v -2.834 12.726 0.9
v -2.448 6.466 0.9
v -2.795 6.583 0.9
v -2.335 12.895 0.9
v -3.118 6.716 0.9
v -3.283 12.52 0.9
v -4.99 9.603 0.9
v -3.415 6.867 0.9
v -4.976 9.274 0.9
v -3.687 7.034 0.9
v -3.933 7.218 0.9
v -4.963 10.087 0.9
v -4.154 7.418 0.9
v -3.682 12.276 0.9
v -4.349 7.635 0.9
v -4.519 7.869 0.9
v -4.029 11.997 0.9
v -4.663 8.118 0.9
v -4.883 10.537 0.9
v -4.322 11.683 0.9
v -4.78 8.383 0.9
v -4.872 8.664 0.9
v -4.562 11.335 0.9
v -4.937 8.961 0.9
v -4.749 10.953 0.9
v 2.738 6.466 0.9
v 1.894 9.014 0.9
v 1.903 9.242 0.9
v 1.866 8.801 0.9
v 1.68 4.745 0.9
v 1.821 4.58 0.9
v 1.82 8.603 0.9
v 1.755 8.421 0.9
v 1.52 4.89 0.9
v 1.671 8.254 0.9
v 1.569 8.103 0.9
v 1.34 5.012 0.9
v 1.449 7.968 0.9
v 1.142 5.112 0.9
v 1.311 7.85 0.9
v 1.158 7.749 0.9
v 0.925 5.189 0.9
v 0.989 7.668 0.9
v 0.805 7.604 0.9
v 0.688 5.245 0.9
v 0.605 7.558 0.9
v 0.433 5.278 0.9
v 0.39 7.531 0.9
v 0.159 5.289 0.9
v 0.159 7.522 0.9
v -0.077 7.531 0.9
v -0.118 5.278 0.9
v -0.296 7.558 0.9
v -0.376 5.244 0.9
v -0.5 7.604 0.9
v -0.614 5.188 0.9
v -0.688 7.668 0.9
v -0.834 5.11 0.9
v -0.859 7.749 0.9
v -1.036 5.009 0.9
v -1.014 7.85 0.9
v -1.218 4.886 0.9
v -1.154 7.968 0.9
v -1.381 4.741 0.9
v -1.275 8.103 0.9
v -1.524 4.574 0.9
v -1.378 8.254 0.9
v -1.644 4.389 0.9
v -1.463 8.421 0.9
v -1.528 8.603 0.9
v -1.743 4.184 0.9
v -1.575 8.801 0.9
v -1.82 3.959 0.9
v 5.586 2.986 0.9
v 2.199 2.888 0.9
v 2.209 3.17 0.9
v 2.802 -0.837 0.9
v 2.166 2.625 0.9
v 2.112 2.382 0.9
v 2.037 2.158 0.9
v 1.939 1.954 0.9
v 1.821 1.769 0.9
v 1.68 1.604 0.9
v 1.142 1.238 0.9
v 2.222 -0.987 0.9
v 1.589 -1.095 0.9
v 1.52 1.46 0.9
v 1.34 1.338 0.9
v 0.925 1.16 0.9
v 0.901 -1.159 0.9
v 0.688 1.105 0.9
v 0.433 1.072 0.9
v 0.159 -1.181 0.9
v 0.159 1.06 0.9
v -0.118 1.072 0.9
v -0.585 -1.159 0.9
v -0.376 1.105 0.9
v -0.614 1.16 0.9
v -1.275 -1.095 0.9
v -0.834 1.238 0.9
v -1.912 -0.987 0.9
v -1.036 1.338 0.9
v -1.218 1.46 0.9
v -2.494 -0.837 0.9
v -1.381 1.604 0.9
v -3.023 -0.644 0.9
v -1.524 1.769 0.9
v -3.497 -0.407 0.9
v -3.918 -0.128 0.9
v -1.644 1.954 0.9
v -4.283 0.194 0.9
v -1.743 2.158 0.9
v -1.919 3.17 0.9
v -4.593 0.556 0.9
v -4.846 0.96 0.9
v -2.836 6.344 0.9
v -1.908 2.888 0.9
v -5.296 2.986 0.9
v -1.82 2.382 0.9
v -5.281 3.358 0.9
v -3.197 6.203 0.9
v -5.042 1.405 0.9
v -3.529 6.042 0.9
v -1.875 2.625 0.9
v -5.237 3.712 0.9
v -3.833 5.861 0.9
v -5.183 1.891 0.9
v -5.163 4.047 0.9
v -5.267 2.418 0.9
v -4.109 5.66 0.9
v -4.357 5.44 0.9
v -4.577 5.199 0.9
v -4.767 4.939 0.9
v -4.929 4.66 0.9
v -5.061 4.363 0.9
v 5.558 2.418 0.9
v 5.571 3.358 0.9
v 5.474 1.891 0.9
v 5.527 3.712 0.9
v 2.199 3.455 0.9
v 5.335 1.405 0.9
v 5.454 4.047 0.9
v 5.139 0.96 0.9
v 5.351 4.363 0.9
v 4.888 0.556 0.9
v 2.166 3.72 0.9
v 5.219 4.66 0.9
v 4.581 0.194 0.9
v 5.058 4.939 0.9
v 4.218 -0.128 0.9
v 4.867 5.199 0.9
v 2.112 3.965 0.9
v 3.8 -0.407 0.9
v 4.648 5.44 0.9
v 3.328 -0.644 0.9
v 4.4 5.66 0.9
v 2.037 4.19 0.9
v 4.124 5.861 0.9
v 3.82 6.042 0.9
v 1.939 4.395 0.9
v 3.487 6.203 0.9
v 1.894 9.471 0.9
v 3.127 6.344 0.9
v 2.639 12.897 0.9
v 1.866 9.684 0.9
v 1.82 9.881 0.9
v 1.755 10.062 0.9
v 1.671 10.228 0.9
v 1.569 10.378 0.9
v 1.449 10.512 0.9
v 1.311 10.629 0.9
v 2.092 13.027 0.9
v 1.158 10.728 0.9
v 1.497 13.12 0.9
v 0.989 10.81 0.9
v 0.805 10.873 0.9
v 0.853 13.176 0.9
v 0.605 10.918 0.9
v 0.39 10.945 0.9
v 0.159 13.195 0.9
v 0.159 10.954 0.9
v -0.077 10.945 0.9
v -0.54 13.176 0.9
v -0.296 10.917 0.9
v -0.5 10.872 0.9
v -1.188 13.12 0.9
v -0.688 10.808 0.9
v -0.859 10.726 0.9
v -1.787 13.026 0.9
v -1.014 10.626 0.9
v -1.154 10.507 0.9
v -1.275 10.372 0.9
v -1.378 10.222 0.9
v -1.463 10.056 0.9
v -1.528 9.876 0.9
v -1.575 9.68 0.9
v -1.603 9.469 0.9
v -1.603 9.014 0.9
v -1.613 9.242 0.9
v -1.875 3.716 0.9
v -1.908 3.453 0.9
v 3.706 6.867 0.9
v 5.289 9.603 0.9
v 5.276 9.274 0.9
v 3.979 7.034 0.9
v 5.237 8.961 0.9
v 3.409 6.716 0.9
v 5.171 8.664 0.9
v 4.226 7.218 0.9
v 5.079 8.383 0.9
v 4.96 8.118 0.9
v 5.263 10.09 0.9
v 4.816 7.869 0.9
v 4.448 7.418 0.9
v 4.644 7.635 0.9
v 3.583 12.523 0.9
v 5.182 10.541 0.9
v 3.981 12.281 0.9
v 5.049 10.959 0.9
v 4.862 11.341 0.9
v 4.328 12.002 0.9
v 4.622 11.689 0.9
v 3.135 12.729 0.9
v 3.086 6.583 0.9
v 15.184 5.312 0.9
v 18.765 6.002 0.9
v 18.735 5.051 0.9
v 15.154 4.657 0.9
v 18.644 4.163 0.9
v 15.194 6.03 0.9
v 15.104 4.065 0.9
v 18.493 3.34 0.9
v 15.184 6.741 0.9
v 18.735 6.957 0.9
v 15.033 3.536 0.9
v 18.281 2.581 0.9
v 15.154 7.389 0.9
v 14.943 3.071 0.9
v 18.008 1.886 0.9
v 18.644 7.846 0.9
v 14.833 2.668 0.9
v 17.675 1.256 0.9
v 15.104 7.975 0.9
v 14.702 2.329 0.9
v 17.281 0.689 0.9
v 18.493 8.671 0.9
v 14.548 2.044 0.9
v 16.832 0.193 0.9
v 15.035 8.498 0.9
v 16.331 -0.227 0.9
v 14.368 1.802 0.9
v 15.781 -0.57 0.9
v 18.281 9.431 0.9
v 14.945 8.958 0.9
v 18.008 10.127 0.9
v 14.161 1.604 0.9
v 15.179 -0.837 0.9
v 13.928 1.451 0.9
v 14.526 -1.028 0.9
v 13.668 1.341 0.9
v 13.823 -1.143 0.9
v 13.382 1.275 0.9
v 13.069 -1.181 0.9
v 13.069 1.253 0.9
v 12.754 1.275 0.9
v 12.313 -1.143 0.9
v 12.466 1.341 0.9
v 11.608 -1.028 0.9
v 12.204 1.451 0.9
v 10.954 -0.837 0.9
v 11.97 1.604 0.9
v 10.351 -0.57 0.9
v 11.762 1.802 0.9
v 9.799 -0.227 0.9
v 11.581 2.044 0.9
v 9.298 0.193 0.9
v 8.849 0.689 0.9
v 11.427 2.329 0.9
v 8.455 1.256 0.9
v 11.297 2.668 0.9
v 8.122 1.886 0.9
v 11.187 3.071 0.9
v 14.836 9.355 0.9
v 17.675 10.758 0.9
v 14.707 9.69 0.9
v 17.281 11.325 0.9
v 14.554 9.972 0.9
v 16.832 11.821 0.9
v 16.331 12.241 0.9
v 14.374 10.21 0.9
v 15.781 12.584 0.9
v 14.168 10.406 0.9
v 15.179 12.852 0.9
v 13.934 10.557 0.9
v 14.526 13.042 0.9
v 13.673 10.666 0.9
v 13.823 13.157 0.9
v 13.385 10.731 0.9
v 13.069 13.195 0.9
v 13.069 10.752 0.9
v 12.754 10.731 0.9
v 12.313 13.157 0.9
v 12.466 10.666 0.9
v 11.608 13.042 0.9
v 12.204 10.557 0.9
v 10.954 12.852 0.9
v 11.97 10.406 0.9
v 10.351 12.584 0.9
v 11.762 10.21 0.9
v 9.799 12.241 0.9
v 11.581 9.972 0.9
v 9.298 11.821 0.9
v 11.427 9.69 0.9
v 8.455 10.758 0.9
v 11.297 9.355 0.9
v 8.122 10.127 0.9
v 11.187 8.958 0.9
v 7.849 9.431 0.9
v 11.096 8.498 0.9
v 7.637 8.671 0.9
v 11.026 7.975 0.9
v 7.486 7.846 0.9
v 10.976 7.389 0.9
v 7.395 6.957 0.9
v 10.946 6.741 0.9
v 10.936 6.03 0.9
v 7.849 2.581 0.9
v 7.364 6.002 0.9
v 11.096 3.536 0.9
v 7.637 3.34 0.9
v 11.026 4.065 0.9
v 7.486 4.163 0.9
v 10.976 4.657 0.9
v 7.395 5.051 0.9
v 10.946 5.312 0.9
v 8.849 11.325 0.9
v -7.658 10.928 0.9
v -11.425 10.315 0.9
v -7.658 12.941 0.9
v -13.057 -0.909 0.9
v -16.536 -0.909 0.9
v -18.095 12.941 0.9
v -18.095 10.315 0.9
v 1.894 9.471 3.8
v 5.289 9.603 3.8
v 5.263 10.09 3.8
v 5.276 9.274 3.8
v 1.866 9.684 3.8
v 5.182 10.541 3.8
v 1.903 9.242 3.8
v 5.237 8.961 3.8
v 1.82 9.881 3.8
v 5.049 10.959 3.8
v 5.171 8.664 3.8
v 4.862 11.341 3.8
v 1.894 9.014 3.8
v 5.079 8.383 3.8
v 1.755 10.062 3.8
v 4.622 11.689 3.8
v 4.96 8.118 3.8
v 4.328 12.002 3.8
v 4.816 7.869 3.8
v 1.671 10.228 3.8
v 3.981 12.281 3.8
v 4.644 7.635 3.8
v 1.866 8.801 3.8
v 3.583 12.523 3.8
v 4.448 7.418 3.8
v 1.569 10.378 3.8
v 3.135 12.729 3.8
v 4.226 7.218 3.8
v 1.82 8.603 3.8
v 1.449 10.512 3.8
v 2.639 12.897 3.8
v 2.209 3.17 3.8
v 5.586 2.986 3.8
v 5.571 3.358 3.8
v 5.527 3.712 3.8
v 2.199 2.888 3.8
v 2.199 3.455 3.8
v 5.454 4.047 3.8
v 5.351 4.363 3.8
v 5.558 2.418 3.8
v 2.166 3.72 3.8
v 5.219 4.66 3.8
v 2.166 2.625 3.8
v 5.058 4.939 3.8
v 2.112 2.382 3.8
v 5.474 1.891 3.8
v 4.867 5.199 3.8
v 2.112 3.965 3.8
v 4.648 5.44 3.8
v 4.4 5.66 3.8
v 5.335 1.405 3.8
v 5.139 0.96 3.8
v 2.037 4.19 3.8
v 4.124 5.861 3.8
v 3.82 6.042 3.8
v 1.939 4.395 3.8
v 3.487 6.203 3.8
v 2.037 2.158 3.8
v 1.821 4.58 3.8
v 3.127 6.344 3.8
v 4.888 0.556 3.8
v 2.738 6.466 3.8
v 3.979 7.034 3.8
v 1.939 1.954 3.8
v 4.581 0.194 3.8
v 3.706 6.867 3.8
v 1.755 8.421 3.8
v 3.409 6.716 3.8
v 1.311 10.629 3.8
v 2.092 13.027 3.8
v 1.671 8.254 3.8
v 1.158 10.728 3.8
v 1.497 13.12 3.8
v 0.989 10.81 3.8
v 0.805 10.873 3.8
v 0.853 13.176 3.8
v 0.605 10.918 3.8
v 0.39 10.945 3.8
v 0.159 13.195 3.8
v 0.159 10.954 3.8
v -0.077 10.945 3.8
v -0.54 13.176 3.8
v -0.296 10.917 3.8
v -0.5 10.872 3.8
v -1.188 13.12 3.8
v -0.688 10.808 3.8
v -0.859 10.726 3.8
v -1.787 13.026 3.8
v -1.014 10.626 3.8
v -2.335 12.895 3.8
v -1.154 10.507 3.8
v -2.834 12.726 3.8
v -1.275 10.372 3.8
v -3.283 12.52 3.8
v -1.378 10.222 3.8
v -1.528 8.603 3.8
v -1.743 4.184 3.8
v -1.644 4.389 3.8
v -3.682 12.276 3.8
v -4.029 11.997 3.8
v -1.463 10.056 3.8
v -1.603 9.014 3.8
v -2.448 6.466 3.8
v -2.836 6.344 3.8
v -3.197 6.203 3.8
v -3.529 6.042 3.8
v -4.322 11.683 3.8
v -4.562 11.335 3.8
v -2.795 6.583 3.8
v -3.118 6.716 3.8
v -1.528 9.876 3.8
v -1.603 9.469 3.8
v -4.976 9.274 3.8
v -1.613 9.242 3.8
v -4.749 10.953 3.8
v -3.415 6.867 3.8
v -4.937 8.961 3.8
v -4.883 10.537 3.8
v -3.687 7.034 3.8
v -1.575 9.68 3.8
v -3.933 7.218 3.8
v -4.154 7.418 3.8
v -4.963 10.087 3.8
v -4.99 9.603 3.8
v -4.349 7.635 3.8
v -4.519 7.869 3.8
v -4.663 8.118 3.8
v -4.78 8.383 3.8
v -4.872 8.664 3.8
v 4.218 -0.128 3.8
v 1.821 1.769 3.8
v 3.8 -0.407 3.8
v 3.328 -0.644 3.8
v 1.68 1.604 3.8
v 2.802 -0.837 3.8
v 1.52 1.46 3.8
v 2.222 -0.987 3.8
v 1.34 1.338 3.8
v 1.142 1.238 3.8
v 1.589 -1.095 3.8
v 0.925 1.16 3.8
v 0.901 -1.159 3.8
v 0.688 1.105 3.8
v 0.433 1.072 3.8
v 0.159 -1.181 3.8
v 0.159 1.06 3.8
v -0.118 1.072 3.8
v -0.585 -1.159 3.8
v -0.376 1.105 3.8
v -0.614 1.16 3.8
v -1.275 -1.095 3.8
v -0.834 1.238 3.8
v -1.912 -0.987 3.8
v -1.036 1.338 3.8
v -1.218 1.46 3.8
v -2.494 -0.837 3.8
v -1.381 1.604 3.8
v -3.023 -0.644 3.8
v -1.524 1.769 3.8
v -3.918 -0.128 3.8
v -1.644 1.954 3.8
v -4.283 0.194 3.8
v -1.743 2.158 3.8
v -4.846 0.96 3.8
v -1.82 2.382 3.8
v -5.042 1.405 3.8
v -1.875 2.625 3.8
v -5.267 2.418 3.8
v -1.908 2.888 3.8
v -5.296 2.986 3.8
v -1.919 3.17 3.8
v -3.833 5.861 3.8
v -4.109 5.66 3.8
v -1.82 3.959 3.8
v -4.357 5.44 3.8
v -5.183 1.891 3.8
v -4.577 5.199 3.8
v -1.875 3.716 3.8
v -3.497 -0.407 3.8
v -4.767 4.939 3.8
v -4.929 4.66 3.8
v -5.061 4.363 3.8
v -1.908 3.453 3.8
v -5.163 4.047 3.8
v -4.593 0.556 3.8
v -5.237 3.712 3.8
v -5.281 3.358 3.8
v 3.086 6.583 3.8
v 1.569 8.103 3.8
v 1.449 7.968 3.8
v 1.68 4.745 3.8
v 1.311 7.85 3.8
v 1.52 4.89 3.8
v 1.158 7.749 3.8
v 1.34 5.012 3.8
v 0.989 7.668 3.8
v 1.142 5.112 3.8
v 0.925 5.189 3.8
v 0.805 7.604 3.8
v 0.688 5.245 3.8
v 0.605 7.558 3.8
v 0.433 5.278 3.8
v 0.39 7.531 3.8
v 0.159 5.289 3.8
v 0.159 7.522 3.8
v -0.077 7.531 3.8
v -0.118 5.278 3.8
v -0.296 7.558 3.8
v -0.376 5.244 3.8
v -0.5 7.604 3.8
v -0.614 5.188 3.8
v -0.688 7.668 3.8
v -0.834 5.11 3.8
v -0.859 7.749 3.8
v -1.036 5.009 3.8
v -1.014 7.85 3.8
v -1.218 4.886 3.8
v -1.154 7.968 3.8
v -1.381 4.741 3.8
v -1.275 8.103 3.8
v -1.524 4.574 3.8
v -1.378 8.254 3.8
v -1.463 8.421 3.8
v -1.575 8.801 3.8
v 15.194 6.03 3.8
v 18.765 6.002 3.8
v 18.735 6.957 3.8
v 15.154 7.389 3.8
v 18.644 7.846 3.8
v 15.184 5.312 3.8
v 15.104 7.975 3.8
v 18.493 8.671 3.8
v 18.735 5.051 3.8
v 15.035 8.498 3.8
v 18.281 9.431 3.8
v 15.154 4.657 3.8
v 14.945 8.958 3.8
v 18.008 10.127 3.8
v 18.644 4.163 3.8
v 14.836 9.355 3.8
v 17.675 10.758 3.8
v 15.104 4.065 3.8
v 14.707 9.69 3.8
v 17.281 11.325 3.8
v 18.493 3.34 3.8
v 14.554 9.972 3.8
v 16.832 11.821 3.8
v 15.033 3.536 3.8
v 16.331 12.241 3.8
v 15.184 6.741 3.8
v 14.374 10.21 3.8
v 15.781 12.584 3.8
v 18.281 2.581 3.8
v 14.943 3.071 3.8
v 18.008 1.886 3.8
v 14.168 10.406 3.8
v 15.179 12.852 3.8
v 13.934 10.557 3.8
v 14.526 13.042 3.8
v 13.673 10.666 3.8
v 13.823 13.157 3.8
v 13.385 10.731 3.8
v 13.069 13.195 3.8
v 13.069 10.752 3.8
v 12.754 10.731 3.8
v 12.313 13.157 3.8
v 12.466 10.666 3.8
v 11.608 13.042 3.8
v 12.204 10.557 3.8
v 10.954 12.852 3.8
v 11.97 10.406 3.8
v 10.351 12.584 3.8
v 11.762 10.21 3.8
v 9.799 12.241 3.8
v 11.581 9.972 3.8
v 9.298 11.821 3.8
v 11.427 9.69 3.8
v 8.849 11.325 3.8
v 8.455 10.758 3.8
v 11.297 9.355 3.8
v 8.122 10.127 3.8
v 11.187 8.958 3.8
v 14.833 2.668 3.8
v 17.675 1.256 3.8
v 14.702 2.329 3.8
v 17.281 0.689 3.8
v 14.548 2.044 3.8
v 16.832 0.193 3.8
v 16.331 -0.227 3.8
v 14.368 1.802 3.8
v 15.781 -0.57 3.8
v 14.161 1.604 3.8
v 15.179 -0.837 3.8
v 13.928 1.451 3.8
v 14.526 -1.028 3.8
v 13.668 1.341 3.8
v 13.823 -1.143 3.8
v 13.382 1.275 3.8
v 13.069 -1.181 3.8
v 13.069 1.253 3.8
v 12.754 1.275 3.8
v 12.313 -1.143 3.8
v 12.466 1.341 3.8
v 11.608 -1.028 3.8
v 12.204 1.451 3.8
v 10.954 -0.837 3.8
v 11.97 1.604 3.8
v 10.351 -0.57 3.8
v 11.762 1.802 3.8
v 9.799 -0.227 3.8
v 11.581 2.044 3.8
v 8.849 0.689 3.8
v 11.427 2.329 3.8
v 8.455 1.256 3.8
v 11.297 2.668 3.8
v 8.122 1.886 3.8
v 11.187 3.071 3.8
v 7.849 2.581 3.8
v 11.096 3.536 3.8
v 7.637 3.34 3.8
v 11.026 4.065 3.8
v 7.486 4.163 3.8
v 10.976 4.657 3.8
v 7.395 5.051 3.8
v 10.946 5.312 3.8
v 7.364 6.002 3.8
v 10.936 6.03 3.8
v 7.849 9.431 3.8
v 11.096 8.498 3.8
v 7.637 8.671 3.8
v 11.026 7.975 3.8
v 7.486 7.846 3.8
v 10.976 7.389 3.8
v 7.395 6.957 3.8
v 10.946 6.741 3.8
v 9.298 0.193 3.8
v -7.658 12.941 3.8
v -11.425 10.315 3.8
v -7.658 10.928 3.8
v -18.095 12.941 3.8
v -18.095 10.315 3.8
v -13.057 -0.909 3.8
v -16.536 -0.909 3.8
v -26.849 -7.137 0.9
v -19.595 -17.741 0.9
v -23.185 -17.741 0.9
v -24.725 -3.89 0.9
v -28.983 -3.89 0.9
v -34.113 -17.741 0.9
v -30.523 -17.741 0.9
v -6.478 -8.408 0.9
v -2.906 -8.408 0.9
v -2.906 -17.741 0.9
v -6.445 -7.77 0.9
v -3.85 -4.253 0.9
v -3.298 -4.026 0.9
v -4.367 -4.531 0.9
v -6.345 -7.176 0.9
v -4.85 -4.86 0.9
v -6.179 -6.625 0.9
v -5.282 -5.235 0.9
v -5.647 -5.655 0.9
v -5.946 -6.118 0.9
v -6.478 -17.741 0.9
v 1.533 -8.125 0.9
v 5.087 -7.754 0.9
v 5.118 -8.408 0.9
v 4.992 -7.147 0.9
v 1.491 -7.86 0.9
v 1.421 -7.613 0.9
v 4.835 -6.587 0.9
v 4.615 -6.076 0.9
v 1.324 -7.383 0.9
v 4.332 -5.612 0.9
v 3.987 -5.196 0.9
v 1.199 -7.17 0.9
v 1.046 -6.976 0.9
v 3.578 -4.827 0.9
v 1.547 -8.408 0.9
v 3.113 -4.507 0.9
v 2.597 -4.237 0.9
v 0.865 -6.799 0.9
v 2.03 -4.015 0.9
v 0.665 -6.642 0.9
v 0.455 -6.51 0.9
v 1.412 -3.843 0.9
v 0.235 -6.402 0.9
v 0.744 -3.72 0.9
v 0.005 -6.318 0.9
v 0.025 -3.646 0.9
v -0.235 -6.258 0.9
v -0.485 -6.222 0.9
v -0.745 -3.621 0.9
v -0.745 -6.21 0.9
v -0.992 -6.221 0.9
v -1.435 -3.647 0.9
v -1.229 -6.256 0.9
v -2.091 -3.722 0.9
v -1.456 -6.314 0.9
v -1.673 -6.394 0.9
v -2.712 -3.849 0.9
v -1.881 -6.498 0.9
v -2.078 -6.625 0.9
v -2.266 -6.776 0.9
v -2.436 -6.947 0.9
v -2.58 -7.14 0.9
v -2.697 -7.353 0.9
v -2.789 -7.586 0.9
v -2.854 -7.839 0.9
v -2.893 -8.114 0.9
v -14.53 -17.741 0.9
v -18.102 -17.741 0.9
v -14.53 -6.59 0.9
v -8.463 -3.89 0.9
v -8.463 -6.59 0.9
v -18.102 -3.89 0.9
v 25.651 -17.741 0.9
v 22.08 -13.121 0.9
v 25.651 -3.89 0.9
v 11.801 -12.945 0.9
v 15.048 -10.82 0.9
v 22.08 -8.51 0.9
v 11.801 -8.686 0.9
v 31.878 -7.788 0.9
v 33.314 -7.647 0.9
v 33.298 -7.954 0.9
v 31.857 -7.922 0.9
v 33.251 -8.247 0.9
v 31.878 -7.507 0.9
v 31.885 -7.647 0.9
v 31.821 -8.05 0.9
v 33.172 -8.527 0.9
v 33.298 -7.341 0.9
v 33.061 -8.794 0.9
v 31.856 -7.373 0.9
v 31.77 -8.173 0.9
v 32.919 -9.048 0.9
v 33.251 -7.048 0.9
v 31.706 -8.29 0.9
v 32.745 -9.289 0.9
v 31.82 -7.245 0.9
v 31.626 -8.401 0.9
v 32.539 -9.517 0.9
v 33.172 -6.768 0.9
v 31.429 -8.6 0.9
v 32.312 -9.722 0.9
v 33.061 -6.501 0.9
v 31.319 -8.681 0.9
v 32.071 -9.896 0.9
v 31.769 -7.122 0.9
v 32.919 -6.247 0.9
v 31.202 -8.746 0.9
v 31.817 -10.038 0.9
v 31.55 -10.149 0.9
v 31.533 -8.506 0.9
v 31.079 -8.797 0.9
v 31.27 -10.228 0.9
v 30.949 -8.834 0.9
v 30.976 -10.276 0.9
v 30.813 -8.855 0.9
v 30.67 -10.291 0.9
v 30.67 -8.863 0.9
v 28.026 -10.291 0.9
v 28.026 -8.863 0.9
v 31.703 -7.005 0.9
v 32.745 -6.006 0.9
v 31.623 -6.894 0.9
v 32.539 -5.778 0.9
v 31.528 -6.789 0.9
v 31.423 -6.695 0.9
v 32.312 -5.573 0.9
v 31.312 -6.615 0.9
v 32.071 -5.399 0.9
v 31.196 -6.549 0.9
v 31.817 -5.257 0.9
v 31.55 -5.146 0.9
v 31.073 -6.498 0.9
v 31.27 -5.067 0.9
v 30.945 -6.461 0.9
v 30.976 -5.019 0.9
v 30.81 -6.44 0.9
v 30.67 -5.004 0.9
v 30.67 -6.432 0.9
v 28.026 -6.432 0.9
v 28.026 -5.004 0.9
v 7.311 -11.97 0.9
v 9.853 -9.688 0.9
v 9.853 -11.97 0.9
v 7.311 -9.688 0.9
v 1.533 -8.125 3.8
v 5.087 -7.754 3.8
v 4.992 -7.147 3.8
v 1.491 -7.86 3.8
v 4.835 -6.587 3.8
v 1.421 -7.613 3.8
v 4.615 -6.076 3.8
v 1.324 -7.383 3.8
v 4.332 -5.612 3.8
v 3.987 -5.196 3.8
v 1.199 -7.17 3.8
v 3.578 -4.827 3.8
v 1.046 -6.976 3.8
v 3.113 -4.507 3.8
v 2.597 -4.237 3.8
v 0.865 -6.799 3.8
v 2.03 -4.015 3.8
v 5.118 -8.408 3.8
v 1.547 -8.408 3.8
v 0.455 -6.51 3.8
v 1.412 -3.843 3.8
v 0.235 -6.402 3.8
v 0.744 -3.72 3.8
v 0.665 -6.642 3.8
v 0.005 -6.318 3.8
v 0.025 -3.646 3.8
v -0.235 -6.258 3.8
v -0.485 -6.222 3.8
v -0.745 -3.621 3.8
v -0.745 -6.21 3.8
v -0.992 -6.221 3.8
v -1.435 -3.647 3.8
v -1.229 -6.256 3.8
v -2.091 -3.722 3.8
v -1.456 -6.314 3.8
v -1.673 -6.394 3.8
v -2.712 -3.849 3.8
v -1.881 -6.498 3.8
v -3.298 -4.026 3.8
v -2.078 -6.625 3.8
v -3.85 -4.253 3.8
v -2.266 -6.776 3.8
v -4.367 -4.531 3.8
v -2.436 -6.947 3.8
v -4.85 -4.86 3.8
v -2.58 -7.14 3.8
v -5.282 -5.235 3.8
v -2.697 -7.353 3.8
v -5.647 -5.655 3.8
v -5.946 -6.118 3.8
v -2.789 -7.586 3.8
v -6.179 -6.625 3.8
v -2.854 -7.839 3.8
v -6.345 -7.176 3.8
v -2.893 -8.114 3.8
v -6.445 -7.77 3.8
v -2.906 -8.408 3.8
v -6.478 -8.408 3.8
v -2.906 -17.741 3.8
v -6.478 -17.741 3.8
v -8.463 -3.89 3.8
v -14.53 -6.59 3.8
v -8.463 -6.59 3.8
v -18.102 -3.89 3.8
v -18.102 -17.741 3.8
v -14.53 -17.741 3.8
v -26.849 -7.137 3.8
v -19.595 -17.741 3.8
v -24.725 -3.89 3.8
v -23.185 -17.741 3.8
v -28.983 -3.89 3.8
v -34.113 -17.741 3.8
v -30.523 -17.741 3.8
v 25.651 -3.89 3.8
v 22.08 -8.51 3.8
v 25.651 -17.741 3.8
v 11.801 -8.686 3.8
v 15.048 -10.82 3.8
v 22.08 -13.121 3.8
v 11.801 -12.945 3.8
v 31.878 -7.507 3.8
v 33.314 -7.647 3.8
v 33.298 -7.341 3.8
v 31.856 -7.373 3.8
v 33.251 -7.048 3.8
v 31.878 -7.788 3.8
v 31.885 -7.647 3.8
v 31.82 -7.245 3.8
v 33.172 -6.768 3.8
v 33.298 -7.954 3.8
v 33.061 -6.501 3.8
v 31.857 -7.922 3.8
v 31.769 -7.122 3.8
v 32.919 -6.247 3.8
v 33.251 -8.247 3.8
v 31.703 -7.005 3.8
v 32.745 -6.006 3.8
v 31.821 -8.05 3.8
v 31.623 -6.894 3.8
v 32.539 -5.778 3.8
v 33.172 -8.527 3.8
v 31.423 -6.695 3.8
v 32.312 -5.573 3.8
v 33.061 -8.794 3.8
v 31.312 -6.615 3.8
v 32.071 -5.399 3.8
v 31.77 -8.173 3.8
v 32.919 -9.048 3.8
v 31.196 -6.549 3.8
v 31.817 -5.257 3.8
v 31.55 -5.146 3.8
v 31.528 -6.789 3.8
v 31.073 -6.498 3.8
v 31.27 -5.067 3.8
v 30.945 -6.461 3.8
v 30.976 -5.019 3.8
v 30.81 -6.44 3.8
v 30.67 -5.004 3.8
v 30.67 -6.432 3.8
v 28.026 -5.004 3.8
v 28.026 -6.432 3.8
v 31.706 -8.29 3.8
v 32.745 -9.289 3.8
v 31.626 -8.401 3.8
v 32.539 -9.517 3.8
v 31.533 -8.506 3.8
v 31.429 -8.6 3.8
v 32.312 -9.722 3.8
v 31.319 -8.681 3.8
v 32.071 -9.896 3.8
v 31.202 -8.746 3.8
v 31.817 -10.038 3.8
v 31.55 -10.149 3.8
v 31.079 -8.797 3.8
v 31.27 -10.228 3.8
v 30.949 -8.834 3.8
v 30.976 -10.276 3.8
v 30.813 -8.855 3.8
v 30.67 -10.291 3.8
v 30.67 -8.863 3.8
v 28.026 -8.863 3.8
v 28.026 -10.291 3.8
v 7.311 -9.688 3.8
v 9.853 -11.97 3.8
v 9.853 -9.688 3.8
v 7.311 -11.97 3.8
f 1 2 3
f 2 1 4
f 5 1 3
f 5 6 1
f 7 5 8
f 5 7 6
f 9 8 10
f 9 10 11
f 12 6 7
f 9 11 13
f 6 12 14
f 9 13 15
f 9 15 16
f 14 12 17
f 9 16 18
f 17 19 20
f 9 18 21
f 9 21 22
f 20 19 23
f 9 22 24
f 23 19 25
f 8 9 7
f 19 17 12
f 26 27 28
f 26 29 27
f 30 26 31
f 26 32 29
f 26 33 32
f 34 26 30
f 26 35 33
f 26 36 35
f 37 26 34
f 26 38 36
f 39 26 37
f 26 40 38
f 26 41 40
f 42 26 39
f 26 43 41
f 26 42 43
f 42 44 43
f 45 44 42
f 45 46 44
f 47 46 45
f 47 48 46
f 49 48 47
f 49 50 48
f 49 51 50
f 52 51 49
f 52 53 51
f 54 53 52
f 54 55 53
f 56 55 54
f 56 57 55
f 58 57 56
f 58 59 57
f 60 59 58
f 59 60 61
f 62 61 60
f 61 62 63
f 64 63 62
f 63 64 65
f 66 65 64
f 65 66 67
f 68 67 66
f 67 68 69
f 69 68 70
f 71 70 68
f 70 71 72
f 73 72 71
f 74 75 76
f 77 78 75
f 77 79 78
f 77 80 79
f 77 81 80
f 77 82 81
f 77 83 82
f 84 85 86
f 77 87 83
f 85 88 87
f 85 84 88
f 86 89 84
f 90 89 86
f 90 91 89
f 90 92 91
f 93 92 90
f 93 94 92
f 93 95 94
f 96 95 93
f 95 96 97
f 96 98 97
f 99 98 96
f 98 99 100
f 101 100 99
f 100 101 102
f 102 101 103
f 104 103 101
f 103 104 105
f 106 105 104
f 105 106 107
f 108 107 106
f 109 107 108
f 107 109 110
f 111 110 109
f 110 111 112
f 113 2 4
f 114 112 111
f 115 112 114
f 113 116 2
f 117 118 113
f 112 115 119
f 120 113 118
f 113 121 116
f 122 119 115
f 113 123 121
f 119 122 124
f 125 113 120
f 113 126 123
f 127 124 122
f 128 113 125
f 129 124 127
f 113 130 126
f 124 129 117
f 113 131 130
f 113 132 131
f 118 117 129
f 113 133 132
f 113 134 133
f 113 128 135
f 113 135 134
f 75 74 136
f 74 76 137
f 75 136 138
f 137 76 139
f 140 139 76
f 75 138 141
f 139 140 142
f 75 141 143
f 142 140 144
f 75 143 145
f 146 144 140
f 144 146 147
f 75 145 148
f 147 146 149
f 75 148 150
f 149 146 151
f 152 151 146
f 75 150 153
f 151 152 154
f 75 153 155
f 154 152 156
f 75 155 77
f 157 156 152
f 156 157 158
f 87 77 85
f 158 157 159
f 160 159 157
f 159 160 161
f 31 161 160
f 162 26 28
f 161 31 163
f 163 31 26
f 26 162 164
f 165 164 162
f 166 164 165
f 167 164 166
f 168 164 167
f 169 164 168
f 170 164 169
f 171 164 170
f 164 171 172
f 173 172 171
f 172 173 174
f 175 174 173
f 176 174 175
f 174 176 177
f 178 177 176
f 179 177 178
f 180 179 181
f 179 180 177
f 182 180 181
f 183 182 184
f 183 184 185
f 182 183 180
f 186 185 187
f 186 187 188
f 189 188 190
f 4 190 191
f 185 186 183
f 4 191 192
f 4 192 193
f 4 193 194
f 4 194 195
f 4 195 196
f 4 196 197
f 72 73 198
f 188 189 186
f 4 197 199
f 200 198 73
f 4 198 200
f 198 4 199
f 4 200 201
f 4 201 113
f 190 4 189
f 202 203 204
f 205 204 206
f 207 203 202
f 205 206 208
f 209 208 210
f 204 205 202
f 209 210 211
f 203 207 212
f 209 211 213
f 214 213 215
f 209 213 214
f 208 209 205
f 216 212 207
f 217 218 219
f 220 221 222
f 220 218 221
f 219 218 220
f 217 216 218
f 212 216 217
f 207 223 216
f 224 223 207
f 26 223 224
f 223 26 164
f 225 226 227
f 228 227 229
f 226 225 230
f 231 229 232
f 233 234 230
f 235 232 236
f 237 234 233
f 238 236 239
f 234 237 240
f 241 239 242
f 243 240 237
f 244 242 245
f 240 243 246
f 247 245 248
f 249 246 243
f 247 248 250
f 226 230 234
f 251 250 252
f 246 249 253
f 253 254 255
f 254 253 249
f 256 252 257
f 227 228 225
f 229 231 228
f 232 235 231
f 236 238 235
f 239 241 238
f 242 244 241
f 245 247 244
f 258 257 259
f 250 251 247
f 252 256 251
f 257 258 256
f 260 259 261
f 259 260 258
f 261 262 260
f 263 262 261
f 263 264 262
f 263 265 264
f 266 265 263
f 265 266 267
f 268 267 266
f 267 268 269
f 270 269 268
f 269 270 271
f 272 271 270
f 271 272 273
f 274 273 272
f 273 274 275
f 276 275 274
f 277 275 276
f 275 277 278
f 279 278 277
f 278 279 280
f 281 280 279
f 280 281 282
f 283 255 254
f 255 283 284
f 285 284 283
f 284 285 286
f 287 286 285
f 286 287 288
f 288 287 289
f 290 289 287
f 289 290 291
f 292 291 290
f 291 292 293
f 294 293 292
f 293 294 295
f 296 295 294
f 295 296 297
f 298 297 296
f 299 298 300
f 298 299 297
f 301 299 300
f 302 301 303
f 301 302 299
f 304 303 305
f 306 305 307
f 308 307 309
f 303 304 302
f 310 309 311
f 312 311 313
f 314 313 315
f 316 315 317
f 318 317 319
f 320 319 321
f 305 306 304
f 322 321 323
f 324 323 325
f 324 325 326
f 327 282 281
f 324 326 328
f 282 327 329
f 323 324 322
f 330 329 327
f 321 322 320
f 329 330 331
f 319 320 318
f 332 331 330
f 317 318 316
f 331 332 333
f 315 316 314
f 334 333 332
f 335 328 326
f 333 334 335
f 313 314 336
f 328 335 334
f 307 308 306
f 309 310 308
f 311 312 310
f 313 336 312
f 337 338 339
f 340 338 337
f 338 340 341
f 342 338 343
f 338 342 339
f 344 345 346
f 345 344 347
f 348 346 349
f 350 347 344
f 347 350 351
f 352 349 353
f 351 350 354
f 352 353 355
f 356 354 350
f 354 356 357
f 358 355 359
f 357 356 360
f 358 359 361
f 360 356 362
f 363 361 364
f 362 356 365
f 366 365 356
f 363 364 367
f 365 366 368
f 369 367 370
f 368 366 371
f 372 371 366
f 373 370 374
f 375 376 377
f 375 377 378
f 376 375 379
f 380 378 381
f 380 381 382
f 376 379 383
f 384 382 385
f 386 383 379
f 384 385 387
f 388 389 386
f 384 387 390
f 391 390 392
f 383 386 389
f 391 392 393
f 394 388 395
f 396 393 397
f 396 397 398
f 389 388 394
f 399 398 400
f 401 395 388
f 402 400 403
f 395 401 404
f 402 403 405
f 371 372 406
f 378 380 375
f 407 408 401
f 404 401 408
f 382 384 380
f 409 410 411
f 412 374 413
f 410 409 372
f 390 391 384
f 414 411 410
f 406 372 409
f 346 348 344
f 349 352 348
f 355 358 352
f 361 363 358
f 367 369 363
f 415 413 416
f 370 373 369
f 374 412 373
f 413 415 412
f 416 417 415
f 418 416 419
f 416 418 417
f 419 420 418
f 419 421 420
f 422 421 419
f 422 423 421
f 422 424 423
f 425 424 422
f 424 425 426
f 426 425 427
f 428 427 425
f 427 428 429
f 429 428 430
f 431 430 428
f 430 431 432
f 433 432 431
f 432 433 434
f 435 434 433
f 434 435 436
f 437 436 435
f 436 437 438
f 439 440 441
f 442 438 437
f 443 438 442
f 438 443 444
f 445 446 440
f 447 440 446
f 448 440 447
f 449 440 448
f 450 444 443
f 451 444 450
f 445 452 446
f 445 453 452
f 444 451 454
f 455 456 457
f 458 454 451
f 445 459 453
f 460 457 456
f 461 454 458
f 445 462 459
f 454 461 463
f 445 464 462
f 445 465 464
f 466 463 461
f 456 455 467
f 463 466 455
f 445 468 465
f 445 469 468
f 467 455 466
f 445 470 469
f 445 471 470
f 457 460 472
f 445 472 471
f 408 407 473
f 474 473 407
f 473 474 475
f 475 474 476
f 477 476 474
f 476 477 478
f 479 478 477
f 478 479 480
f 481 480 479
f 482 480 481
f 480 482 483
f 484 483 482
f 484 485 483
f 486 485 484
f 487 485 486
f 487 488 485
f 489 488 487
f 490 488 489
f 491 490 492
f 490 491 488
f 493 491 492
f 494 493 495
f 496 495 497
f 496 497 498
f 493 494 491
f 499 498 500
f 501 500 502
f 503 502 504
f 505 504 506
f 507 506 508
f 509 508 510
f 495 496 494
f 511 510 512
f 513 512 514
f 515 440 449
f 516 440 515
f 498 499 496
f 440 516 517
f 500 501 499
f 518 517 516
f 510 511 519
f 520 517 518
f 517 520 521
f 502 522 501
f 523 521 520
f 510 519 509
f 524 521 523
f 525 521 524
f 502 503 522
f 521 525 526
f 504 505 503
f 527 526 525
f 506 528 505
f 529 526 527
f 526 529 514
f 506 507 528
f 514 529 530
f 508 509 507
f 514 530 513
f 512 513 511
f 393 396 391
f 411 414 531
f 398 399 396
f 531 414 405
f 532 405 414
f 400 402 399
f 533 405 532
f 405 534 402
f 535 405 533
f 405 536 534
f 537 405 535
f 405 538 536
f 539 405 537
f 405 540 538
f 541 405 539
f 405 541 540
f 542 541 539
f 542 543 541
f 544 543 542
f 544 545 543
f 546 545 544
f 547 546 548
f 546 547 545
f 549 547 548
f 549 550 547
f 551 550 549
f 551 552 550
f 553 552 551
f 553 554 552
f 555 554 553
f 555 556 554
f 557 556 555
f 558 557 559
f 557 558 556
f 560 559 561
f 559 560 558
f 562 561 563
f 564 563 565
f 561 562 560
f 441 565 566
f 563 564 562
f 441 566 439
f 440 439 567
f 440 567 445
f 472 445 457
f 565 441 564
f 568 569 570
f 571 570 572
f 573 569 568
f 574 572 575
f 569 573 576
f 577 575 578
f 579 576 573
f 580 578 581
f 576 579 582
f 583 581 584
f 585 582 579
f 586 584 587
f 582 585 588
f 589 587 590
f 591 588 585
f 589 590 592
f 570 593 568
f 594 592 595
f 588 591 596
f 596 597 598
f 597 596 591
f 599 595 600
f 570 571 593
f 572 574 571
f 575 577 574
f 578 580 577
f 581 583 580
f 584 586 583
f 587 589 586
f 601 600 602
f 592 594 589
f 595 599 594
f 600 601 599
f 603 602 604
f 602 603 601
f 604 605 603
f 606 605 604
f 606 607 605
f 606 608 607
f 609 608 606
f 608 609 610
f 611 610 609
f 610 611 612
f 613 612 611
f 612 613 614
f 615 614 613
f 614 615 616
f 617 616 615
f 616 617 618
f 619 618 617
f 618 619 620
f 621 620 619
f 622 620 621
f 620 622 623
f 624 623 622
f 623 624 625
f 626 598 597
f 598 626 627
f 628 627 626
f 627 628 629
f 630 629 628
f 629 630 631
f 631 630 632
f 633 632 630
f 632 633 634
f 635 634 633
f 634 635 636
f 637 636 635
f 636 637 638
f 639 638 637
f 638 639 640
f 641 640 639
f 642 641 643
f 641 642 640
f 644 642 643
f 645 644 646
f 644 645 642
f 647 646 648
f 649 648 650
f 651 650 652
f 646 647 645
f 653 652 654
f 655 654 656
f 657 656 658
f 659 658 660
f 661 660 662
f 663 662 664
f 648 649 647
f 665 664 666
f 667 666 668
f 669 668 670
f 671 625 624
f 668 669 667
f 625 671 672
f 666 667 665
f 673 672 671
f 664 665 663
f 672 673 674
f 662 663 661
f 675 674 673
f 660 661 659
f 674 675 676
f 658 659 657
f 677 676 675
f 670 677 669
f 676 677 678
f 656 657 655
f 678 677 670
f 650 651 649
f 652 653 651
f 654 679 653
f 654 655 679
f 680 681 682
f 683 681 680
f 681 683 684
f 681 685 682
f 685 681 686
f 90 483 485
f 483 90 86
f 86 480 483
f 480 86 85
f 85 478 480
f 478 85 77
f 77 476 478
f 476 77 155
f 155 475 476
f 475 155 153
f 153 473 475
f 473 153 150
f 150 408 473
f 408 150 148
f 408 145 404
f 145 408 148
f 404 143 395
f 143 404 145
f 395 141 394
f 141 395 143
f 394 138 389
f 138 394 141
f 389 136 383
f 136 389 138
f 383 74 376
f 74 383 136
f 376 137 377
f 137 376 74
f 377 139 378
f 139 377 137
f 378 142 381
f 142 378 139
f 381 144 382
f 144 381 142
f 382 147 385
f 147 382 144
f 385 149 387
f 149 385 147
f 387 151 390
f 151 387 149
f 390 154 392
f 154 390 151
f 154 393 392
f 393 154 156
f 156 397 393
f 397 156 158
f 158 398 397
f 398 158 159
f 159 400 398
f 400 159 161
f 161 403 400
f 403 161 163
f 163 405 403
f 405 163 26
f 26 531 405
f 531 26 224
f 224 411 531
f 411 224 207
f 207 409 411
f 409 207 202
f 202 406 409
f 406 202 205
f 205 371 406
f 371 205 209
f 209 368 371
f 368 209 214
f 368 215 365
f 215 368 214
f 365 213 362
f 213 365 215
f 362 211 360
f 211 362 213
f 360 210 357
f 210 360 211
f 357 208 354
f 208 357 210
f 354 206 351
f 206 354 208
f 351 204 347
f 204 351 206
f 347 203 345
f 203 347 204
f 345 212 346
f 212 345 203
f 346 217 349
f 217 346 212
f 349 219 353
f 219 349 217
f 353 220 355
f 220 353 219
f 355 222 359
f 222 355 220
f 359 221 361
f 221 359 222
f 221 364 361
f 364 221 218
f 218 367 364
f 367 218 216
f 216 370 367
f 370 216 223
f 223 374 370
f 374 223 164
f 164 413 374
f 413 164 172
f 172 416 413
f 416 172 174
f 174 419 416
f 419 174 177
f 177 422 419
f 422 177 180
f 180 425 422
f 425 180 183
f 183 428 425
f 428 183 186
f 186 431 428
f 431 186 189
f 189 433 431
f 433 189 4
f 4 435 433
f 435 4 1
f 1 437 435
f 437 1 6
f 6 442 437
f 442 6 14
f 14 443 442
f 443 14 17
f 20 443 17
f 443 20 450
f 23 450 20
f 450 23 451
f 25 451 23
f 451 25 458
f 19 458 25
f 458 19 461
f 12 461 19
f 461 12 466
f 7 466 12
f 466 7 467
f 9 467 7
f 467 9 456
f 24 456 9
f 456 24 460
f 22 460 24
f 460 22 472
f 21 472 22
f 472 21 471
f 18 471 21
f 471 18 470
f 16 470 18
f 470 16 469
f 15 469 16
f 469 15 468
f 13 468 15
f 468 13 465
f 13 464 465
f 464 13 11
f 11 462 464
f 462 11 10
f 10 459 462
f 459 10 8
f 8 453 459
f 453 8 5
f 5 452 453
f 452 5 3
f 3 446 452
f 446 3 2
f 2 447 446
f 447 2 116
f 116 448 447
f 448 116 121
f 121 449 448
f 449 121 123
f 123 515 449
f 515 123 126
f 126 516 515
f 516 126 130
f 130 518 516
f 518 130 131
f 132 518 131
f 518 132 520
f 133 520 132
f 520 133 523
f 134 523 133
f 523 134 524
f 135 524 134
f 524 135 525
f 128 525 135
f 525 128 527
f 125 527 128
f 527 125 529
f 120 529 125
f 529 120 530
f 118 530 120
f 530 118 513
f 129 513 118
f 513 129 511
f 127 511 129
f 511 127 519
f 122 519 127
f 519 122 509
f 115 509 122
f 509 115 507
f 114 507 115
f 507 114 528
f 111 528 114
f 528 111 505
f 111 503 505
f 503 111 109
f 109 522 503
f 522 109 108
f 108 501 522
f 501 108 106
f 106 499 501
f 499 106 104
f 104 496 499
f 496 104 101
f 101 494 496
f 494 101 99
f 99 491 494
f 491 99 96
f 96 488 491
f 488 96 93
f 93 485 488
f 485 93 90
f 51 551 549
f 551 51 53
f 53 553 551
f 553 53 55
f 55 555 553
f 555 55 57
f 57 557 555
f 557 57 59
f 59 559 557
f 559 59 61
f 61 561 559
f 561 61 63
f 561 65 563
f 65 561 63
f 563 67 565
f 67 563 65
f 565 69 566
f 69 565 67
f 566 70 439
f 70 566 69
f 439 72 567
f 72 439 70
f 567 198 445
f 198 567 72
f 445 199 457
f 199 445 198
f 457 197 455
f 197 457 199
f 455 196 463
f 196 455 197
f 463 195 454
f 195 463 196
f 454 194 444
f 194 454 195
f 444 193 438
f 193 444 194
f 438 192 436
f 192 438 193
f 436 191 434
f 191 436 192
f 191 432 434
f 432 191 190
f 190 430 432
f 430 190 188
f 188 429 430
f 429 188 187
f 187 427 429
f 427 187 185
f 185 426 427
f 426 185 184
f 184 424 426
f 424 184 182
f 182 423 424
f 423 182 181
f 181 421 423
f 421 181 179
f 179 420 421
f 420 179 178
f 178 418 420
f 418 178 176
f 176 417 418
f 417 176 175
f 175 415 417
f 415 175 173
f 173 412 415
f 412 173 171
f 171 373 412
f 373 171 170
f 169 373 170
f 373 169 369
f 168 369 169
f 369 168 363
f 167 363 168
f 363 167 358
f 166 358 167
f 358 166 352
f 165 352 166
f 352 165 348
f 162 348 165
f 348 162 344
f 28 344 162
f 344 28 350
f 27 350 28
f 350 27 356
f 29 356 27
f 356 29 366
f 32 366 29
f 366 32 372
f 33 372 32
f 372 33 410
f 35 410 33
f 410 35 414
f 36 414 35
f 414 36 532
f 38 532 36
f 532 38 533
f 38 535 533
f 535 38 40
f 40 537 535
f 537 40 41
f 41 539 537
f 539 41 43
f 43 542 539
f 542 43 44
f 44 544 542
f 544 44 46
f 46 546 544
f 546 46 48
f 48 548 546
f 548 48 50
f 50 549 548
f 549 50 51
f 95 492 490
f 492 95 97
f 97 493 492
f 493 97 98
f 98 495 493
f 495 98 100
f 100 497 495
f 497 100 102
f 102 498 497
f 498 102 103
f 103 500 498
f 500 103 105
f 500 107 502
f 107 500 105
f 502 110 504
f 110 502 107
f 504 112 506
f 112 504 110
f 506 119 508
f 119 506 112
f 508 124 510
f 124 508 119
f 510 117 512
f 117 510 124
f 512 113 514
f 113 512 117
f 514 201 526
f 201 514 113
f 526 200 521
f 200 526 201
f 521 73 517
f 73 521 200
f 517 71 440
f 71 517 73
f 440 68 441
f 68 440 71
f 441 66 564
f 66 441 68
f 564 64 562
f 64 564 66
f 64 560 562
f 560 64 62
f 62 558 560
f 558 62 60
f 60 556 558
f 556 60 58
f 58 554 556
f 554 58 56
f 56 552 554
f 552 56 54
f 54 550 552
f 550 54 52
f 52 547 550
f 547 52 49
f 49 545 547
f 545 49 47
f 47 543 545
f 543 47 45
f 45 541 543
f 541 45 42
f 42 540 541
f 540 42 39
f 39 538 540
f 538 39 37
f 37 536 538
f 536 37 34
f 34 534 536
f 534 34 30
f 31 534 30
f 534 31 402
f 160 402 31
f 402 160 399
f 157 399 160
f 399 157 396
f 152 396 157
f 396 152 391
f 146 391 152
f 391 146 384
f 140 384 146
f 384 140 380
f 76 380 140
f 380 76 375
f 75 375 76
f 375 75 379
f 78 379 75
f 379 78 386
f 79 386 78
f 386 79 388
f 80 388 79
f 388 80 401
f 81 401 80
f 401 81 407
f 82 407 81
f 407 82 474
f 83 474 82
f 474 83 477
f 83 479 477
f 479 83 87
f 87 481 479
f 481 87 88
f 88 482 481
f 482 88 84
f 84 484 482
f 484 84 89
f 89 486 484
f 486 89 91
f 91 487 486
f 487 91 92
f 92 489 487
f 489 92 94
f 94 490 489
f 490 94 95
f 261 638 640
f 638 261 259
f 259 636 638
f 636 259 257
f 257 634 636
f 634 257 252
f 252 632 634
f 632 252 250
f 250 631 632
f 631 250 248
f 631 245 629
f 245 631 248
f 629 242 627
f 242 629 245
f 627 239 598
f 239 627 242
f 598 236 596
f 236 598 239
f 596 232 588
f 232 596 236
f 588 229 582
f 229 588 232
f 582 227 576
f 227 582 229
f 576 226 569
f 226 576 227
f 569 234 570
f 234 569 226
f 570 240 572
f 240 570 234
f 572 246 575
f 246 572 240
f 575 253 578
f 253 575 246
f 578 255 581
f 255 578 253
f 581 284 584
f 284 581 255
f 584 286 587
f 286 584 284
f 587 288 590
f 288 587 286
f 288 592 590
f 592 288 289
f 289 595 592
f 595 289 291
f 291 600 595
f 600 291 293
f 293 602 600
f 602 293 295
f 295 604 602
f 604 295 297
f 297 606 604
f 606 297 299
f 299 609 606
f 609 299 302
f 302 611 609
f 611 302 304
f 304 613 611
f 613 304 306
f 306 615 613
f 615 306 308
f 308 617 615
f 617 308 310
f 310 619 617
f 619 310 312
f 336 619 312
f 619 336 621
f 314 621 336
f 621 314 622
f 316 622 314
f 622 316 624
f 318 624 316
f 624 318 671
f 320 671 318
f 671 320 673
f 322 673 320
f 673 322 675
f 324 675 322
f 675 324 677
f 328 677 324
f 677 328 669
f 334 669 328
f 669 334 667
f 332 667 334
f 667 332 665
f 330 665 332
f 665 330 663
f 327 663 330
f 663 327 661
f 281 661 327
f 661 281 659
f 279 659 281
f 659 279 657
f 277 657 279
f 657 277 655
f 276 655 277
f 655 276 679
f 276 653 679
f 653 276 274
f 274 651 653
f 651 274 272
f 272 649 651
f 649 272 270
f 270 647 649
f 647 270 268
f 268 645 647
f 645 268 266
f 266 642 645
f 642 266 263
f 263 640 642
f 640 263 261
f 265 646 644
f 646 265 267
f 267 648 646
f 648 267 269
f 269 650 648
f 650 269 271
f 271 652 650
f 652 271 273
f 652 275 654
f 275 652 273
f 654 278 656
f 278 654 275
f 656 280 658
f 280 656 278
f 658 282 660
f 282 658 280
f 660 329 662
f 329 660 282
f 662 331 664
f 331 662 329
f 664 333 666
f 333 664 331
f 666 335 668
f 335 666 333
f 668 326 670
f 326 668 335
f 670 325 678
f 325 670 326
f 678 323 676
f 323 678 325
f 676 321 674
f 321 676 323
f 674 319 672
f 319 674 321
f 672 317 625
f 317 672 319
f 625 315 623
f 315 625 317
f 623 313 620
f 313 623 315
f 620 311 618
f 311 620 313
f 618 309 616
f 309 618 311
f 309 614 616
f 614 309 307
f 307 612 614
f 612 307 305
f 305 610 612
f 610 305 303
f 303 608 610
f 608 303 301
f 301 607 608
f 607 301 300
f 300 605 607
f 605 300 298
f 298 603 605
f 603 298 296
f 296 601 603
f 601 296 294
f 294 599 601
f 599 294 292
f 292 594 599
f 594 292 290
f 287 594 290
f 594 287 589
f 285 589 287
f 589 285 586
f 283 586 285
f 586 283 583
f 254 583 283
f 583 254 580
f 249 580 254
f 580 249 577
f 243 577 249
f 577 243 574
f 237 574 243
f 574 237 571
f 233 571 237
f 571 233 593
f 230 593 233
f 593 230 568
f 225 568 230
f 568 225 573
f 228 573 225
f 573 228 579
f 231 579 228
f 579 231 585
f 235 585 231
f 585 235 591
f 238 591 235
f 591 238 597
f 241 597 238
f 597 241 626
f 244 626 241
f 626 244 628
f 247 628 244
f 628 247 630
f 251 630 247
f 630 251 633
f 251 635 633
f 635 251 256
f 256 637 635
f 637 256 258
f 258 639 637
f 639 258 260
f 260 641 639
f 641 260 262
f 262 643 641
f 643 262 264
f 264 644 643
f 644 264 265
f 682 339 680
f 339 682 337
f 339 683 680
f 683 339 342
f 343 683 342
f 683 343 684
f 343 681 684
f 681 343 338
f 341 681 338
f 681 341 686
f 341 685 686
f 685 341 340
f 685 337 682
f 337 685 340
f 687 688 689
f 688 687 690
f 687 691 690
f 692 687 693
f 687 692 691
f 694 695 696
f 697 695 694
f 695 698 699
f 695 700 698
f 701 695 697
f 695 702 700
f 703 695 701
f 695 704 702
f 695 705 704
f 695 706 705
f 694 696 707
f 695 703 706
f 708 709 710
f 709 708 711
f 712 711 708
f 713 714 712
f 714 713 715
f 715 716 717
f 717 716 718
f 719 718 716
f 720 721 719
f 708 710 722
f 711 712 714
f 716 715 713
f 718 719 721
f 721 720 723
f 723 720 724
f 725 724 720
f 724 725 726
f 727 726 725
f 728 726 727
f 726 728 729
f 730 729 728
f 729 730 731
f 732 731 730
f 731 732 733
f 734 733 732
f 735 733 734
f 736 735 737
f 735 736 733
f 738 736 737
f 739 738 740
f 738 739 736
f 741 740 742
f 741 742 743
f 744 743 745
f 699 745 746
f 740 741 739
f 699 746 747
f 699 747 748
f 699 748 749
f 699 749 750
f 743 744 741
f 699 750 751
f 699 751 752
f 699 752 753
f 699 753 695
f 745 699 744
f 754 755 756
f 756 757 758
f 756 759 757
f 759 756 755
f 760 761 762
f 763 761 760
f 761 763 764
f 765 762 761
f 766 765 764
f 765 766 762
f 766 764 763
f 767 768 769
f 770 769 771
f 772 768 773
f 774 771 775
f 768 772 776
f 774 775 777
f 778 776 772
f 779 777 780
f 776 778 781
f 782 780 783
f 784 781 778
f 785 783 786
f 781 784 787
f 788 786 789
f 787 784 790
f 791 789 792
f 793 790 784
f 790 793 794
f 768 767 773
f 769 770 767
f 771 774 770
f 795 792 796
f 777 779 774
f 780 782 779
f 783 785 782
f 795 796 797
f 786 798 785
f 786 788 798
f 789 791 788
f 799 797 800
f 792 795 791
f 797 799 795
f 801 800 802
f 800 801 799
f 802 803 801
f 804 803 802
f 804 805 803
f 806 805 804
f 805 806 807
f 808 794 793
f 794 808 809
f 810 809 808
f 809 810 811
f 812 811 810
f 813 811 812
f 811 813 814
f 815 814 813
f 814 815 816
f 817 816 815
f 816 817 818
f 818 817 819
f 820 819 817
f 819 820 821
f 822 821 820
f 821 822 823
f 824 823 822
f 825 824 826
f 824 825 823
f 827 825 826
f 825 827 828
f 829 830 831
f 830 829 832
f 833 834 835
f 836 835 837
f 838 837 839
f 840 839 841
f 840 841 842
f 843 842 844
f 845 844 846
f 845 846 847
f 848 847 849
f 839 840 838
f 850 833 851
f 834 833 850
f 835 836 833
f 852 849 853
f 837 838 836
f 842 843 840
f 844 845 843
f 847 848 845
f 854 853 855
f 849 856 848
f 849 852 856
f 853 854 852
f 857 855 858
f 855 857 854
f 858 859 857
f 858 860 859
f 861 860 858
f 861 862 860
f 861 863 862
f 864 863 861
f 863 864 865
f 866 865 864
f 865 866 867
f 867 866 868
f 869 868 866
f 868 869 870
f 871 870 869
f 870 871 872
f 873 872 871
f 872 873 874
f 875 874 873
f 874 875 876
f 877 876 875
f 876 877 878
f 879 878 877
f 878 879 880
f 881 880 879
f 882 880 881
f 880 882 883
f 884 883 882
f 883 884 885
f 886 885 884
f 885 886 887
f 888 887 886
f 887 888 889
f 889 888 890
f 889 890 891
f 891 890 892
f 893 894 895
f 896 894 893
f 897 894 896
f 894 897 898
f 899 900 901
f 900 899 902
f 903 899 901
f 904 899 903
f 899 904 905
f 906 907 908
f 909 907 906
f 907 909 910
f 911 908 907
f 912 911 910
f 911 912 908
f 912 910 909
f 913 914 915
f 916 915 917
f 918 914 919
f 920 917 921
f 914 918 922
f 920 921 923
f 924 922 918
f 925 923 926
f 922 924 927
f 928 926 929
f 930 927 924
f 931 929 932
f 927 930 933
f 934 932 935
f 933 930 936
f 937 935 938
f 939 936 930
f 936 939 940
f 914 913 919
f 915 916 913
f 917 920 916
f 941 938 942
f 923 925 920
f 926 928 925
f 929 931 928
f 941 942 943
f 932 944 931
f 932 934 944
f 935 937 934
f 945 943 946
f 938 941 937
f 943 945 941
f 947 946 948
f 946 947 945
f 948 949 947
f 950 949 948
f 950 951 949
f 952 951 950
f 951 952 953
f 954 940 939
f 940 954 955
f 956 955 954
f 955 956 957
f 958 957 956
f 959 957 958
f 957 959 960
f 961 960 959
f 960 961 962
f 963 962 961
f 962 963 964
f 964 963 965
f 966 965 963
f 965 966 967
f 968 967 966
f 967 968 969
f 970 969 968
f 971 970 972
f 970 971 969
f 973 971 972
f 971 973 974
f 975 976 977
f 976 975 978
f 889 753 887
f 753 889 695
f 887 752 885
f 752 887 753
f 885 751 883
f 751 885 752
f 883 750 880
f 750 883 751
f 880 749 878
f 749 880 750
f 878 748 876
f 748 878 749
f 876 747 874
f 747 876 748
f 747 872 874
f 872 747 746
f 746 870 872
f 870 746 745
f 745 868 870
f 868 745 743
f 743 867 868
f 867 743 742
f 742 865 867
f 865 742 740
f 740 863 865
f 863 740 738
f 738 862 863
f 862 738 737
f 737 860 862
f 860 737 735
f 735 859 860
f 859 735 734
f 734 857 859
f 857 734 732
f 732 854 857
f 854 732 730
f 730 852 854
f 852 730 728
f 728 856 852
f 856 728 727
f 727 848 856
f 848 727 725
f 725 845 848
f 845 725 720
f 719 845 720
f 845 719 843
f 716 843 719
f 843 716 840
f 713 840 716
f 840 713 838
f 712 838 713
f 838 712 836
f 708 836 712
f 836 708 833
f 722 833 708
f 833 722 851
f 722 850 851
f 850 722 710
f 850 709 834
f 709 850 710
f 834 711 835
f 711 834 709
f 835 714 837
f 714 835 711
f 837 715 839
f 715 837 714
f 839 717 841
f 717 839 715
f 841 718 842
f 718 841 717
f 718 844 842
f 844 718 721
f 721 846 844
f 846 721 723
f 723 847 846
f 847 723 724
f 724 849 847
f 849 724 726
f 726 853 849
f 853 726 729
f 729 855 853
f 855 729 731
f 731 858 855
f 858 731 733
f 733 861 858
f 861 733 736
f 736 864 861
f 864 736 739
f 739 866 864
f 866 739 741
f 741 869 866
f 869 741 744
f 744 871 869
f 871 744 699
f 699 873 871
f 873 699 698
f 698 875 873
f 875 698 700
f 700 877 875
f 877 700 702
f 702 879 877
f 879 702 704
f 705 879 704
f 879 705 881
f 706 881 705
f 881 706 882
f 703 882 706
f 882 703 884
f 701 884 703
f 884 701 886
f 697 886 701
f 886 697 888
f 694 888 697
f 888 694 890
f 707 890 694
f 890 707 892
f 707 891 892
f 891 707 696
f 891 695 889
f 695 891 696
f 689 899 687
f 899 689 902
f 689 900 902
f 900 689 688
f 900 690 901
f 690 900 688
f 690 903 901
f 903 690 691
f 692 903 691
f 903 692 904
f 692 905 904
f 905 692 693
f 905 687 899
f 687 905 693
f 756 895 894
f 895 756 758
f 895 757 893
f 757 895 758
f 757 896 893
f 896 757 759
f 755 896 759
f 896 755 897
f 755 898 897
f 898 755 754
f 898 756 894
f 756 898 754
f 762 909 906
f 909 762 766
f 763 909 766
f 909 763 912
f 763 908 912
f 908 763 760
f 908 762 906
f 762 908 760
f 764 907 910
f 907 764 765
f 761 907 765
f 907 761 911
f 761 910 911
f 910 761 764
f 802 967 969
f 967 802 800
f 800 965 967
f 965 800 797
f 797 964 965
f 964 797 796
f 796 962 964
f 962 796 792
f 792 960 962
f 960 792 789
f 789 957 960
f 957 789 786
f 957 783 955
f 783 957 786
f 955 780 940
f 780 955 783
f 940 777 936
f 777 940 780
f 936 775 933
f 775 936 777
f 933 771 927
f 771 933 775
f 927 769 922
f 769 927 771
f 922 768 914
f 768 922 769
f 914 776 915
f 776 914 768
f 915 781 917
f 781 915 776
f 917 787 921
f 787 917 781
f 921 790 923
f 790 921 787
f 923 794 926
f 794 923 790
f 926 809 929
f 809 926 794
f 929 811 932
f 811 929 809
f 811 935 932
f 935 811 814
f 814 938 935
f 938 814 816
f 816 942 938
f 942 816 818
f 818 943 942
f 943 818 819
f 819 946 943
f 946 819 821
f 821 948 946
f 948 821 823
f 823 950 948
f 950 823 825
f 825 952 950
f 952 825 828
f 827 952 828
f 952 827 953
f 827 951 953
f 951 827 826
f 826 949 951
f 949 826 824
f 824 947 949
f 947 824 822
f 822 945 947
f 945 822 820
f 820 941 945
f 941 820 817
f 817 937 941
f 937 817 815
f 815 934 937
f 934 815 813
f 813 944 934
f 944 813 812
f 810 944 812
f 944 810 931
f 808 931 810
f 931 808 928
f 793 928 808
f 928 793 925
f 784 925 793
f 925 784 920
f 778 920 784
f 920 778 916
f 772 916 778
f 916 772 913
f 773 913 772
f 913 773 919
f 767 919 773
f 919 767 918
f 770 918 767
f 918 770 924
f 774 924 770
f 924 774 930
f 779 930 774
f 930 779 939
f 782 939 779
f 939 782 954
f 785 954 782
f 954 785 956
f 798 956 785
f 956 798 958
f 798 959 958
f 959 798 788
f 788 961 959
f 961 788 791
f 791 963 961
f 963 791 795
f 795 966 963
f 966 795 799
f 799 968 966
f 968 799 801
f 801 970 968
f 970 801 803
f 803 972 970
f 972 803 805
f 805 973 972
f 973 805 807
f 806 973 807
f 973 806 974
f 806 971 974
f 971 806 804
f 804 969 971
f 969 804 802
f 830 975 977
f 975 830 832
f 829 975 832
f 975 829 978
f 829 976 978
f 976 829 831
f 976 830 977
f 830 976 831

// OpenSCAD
$fn = 48;
  // syllabics (overlaid on icon, tallest)
  translate([0, 5.845, 0.900]) linear_extrude(height=2.900) text("780", size=13.680, halign="center", valign="center", font="Euphemia UCAS:style=Bold");
  translate([0, -10.845, 0.900]) linear_extrude(height=2.900) text("ᐱᒥᒋᐗᐣ", size=13.680, halign="center", valign="center", font="Euphemia UCAS:style=Bold");
